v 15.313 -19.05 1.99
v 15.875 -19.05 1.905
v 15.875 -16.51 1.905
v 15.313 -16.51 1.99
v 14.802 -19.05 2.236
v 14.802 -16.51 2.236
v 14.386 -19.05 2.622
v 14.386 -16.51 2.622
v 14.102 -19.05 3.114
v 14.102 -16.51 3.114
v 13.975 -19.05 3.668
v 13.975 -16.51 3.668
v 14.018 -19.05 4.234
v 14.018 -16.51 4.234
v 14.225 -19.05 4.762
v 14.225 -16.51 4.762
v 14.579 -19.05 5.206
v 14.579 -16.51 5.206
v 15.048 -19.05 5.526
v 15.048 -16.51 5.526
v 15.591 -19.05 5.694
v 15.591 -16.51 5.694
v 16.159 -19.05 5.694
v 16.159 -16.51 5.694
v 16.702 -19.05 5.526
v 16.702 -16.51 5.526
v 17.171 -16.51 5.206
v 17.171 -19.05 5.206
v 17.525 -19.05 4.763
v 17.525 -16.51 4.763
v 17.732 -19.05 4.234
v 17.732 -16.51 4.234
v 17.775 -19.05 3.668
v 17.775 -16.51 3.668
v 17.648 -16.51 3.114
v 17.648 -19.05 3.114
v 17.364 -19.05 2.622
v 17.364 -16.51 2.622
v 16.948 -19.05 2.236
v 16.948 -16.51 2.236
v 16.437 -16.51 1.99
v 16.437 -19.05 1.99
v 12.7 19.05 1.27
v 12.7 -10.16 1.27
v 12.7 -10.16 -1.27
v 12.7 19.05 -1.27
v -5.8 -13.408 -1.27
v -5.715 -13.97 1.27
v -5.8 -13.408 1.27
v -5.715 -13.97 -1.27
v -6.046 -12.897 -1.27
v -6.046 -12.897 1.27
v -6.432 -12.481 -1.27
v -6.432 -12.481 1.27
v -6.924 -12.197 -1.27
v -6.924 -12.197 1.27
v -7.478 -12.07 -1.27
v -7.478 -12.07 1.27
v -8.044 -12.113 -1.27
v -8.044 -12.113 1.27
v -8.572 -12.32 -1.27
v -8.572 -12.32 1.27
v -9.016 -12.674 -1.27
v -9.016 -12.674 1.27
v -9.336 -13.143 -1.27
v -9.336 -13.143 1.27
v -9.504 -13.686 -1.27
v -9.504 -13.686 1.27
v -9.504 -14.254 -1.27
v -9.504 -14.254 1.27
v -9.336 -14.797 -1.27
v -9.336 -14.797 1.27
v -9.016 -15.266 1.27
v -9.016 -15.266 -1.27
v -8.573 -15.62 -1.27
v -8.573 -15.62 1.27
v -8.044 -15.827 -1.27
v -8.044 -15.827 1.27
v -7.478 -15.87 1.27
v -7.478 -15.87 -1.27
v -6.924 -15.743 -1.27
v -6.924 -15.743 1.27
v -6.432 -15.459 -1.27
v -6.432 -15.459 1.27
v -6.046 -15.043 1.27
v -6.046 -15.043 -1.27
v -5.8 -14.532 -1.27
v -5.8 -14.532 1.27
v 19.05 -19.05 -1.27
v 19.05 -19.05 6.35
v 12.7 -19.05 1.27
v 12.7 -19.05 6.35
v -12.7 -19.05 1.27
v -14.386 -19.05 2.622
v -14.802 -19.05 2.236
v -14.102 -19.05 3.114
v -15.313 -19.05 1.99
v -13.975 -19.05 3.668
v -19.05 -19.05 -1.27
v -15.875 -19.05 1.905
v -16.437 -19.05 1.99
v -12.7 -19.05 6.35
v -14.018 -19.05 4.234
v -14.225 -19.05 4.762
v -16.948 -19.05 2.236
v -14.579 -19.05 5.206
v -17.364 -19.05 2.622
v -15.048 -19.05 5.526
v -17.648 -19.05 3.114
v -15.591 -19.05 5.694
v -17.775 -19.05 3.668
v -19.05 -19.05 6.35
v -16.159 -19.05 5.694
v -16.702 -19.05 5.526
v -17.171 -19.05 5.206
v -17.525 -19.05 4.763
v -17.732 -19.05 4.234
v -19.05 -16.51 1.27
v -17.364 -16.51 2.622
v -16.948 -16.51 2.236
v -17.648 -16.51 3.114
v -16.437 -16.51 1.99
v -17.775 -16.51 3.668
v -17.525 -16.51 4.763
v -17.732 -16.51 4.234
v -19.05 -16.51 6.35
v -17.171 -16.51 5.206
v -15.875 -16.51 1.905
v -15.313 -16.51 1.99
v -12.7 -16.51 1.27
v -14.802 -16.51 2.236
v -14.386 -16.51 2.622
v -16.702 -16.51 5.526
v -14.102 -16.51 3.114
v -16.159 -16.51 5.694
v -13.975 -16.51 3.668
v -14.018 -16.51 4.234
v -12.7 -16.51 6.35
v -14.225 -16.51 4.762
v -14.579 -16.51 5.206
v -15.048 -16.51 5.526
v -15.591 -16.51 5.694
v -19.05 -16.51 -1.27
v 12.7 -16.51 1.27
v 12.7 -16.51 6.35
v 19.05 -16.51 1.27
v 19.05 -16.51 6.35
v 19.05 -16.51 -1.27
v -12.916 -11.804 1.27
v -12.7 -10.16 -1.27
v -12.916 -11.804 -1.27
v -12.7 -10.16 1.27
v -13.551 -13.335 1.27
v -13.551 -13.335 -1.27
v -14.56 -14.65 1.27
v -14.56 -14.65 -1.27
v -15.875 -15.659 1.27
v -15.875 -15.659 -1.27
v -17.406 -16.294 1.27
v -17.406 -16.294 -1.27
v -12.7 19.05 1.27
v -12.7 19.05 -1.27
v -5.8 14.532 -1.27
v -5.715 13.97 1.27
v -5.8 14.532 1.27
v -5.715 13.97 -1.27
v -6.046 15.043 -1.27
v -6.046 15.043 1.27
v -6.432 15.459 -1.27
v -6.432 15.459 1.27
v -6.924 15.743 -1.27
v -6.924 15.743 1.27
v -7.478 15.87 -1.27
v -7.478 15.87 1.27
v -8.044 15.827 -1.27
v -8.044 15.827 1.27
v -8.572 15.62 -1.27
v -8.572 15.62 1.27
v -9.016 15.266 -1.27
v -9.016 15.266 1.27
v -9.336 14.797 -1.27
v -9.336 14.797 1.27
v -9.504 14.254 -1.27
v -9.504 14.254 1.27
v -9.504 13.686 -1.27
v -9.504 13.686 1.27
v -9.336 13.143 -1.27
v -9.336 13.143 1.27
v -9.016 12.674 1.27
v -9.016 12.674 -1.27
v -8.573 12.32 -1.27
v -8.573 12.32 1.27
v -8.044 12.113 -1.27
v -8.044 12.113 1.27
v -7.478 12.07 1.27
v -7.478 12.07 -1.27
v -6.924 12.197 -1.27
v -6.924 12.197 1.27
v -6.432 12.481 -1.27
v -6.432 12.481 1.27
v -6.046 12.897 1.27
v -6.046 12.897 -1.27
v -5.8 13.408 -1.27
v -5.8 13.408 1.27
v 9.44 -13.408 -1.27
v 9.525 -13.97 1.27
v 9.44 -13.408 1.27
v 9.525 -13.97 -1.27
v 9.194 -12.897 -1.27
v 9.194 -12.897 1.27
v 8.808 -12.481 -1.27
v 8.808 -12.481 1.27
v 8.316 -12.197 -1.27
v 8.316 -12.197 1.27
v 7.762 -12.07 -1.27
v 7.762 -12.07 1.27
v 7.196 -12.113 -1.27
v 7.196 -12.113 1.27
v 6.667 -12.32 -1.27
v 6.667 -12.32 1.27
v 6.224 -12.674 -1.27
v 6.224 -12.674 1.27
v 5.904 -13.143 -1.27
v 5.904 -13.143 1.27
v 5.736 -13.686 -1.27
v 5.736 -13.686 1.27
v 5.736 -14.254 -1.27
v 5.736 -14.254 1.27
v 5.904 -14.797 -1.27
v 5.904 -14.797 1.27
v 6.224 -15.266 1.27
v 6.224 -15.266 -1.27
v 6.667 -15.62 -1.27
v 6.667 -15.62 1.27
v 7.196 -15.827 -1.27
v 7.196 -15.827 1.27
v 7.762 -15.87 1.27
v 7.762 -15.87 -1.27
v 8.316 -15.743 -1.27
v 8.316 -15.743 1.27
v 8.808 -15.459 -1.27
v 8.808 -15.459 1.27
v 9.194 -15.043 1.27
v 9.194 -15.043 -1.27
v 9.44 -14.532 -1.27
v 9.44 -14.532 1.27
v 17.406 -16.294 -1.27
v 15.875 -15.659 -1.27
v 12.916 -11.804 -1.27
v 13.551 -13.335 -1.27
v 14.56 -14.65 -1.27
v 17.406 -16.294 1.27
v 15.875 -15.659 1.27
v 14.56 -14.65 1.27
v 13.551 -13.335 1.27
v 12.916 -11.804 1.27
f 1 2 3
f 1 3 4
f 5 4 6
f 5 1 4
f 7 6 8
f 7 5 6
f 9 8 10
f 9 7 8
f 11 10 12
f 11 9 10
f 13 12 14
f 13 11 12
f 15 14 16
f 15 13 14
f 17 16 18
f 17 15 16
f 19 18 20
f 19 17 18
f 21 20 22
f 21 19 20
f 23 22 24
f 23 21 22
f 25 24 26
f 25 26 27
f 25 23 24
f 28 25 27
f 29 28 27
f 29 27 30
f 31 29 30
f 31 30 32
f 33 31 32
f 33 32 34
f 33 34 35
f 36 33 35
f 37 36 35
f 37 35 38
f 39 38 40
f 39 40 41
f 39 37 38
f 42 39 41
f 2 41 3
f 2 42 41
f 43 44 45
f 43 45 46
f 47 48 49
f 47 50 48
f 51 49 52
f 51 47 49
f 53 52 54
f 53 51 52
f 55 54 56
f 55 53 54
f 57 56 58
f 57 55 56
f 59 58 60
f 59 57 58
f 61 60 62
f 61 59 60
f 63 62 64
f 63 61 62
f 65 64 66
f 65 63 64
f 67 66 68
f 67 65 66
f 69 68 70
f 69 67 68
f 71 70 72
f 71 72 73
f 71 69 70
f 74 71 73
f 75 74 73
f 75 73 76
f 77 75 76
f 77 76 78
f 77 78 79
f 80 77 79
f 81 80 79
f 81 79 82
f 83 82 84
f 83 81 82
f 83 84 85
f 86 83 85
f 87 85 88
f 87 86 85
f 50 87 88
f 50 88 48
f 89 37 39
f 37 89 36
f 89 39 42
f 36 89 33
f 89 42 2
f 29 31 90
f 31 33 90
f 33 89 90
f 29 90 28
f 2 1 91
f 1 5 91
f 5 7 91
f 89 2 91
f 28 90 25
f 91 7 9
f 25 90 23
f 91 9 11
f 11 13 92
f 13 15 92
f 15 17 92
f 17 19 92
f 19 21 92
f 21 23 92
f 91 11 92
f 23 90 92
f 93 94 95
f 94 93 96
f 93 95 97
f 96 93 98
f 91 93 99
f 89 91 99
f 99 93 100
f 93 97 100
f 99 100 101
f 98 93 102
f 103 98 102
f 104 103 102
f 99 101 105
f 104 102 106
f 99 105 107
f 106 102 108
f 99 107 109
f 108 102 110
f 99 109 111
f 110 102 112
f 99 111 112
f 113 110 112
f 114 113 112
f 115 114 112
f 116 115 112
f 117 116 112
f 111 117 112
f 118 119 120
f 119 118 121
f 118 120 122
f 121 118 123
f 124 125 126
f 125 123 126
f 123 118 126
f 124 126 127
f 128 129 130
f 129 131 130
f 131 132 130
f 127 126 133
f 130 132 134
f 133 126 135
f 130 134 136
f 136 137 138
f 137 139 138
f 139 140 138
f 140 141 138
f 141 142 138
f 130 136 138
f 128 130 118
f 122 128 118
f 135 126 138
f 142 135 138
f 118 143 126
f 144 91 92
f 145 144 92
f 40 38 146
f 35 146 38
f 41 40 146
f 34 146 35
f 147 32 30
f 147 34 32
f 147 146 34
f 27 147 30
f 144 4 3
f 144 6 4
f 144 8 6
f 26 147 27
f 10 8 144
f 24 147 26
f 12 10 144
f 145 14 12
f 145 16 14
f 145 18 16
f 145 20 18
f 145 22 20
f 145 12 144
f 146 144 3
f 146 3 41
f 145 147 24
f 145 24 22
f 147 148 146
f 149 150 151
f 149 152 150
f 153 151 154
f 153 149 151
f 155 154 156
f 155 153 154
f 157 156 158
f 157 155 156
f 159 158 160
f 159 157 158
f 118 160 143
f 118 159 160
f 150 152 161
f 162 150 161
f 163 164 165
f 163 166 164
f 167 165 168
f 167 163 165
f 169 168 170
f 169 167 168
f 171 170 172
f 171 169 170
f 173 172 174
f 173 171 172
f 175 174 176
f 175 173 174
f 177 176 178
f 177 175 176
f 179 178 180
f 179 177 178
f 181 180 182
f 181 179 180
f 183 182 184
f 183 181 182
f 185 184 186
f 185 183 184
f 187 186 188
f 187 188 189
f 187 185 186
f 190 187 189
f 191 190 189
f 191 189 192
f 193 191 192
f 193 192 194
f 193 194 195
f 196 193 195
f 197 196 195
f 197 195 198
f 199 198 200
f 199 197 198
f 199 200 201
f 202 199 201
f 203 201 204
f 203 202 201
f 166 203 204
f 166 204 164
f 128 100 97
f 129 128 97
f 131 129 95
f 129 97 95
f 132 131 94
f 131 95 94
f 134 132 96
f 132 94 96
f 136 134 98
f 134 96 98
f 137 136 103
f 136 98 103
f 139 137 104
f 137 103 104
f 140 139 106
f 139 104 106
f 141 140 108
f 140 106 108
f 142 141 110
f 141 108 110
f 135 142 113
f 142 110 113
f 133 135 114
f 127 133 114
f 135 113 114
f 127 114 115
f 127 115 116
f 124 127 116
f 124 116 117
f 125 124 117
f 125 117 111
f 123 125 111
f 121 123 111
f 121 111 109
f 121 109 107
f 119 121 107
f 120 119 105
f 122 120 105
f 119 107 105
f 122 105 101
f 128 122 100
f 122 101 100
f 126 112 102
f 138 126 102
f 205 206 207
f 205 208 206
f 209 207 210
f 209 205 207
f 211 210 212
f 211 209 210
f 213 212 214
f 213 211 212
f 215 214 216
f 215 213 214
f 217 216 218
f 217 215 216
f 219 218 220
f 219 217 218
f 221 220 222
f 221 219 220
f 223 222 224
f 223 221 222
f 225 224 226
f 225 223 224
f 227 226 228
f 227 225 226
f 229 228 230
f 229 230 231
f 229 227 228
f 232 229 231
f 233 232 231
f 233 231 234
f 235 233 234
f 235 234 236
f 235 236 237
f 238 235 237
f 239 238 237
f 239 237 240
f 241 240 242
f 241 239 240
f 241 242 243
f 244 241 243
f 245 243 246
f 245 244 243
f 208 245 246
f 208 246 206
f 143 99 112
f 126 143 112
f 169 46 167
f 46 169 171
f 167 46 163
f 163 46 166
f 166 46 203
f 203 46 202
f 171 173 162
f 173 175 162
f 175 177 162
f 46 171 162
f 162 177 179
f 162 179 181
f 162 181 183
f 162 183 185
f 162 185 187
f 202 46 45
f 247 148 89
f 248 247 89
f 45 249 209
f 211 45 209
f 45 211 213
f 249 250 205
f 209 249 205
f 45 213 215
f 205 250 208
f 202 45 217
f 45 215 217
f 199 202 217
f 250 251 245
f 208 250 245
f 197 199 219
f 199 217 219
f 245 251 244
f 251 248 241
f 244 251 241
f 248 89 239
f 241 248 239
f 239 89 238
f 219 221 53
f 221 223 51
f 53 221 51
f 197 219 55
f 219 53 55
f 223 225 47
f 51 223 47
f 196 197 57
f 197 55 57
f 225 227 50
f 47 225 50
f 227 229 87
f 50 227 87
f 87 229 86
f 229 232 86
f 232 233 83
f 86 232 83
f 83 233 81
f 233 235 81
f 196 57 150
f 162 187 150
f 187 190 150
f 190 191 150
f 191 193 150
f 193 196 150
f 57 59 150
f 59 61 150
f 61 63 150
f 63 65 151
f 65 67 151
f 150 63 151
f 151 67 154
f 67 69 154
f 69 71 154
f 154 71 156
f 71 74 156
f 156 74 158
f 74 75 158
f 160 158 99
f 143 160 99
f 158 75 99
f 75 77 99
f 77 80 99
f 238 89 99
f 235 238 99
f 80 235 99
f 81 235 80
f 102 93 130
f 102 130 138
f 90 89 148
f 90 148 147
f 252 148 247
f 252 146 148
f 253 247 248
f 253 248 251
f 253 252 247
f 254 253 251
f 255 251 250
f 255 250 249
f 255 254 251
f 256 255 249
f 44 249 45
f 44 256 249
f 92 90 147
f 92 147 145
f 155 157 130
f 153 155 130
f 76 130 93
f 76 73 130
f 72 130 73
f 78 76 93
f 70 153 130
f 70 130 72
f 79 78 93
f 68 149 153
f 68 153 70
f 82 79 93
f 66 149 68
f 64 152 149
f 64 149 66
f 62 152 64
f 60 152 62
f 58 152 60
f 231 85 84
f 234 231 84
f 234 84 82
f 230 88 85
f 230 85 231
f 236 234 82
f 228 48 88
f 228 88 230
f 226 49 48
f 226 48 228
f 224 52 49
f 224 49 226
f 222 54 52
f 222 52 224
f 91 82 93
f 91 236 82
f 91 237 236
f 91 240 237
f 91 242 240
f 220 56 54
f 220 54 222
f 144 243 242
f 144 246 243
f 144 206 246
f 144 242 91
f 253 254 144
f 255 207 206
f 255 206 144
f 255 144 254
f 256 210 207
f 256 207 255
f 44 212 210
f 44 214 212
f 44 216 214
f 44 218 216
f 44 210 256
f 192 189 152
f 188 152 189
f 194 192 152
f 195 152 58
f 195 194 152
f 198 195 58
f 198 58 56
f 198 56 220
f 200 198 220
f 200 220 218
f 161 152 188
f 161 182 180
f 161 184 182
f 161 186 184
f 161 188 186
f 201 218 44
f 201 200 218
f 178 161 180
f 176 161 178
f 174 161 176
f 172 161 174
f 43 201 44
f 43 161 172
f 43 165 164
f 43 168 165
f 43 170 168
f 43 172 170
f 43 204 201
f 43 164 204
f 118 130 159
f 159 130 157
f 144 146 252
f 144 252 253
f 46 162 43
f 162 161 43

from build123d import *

# Parameters (mm, degrees)
SKETCH1_W           = 25.4
SKETCH1_H           = 38.1
SKETCH1_R           = 1.905
BOSS_EXTRUDE1_DEPTH = 1.27
SKETCH2_W           = 6.35
SKETCH2_H           = 7.62
SKETCH2_R           = 1.905
BOSS_EXTRUDE2_DEPTH = 2.54
FILLET1_R           = 6.35


with BuildPart() as part:
    # Sketch1 → Boss-Extrude1 (new, symmetric)
    with BuildSketch(Plane.XY):
        Rectangle(SKETCH1_W, SKETCH1_H)
        with Locations((-7.62, 13.97)):
            Circle(SKETCH1_R, mode=Mode.SUBTRACT)
        with Locations((-7.62, -13.97)):
            Circle(SKETCH1_R, mode=Mode.SUBTRACT)
        with Locations((7.62, -13.97)):
            Circle(SKETCH1_R, mode=Mode.SUBTRACT)
    extrude(amount=BOSS_EXTRUDE1_DEPTH, both=True)

    # Sketch2 → Boss-Extrude2 (add)
    with BuildSketch(Plane.XZ.offset(19.05)):
        with Locations((-15.875, 2.54)):
            Rectangle(SKETCH2_W, SKETCH2_H)
        with Locations(Location((-15.875, 3.81, 0), (0, 0, 270))):
            Circle(SKETCH2_R, mode=Mode.SUBTRACT)
    boss_extrude2 = extrude(amount=-BOSS_EXTRUDE2_DEPTH)

    # Mirror5: Boss-Extrude2 across plane
    add(boss_extrude2.mirror(Plane(origin=(0, 0, 0), x_dir=(0, 0, 1), z_dir=(1, 0, 0))))

    # Fillet1
    fillet1_edges = [part.edges().sort_by_distance(p)[0] for p in [
        (-12.7, -16.51, 0),
        (12.7, -16.51, 0),
    ]]
    fillet(fillet1_edges, radius=FILLET1_R - 0.0001)  # a hair under: the kernel refuses the full size


solid = part.part
